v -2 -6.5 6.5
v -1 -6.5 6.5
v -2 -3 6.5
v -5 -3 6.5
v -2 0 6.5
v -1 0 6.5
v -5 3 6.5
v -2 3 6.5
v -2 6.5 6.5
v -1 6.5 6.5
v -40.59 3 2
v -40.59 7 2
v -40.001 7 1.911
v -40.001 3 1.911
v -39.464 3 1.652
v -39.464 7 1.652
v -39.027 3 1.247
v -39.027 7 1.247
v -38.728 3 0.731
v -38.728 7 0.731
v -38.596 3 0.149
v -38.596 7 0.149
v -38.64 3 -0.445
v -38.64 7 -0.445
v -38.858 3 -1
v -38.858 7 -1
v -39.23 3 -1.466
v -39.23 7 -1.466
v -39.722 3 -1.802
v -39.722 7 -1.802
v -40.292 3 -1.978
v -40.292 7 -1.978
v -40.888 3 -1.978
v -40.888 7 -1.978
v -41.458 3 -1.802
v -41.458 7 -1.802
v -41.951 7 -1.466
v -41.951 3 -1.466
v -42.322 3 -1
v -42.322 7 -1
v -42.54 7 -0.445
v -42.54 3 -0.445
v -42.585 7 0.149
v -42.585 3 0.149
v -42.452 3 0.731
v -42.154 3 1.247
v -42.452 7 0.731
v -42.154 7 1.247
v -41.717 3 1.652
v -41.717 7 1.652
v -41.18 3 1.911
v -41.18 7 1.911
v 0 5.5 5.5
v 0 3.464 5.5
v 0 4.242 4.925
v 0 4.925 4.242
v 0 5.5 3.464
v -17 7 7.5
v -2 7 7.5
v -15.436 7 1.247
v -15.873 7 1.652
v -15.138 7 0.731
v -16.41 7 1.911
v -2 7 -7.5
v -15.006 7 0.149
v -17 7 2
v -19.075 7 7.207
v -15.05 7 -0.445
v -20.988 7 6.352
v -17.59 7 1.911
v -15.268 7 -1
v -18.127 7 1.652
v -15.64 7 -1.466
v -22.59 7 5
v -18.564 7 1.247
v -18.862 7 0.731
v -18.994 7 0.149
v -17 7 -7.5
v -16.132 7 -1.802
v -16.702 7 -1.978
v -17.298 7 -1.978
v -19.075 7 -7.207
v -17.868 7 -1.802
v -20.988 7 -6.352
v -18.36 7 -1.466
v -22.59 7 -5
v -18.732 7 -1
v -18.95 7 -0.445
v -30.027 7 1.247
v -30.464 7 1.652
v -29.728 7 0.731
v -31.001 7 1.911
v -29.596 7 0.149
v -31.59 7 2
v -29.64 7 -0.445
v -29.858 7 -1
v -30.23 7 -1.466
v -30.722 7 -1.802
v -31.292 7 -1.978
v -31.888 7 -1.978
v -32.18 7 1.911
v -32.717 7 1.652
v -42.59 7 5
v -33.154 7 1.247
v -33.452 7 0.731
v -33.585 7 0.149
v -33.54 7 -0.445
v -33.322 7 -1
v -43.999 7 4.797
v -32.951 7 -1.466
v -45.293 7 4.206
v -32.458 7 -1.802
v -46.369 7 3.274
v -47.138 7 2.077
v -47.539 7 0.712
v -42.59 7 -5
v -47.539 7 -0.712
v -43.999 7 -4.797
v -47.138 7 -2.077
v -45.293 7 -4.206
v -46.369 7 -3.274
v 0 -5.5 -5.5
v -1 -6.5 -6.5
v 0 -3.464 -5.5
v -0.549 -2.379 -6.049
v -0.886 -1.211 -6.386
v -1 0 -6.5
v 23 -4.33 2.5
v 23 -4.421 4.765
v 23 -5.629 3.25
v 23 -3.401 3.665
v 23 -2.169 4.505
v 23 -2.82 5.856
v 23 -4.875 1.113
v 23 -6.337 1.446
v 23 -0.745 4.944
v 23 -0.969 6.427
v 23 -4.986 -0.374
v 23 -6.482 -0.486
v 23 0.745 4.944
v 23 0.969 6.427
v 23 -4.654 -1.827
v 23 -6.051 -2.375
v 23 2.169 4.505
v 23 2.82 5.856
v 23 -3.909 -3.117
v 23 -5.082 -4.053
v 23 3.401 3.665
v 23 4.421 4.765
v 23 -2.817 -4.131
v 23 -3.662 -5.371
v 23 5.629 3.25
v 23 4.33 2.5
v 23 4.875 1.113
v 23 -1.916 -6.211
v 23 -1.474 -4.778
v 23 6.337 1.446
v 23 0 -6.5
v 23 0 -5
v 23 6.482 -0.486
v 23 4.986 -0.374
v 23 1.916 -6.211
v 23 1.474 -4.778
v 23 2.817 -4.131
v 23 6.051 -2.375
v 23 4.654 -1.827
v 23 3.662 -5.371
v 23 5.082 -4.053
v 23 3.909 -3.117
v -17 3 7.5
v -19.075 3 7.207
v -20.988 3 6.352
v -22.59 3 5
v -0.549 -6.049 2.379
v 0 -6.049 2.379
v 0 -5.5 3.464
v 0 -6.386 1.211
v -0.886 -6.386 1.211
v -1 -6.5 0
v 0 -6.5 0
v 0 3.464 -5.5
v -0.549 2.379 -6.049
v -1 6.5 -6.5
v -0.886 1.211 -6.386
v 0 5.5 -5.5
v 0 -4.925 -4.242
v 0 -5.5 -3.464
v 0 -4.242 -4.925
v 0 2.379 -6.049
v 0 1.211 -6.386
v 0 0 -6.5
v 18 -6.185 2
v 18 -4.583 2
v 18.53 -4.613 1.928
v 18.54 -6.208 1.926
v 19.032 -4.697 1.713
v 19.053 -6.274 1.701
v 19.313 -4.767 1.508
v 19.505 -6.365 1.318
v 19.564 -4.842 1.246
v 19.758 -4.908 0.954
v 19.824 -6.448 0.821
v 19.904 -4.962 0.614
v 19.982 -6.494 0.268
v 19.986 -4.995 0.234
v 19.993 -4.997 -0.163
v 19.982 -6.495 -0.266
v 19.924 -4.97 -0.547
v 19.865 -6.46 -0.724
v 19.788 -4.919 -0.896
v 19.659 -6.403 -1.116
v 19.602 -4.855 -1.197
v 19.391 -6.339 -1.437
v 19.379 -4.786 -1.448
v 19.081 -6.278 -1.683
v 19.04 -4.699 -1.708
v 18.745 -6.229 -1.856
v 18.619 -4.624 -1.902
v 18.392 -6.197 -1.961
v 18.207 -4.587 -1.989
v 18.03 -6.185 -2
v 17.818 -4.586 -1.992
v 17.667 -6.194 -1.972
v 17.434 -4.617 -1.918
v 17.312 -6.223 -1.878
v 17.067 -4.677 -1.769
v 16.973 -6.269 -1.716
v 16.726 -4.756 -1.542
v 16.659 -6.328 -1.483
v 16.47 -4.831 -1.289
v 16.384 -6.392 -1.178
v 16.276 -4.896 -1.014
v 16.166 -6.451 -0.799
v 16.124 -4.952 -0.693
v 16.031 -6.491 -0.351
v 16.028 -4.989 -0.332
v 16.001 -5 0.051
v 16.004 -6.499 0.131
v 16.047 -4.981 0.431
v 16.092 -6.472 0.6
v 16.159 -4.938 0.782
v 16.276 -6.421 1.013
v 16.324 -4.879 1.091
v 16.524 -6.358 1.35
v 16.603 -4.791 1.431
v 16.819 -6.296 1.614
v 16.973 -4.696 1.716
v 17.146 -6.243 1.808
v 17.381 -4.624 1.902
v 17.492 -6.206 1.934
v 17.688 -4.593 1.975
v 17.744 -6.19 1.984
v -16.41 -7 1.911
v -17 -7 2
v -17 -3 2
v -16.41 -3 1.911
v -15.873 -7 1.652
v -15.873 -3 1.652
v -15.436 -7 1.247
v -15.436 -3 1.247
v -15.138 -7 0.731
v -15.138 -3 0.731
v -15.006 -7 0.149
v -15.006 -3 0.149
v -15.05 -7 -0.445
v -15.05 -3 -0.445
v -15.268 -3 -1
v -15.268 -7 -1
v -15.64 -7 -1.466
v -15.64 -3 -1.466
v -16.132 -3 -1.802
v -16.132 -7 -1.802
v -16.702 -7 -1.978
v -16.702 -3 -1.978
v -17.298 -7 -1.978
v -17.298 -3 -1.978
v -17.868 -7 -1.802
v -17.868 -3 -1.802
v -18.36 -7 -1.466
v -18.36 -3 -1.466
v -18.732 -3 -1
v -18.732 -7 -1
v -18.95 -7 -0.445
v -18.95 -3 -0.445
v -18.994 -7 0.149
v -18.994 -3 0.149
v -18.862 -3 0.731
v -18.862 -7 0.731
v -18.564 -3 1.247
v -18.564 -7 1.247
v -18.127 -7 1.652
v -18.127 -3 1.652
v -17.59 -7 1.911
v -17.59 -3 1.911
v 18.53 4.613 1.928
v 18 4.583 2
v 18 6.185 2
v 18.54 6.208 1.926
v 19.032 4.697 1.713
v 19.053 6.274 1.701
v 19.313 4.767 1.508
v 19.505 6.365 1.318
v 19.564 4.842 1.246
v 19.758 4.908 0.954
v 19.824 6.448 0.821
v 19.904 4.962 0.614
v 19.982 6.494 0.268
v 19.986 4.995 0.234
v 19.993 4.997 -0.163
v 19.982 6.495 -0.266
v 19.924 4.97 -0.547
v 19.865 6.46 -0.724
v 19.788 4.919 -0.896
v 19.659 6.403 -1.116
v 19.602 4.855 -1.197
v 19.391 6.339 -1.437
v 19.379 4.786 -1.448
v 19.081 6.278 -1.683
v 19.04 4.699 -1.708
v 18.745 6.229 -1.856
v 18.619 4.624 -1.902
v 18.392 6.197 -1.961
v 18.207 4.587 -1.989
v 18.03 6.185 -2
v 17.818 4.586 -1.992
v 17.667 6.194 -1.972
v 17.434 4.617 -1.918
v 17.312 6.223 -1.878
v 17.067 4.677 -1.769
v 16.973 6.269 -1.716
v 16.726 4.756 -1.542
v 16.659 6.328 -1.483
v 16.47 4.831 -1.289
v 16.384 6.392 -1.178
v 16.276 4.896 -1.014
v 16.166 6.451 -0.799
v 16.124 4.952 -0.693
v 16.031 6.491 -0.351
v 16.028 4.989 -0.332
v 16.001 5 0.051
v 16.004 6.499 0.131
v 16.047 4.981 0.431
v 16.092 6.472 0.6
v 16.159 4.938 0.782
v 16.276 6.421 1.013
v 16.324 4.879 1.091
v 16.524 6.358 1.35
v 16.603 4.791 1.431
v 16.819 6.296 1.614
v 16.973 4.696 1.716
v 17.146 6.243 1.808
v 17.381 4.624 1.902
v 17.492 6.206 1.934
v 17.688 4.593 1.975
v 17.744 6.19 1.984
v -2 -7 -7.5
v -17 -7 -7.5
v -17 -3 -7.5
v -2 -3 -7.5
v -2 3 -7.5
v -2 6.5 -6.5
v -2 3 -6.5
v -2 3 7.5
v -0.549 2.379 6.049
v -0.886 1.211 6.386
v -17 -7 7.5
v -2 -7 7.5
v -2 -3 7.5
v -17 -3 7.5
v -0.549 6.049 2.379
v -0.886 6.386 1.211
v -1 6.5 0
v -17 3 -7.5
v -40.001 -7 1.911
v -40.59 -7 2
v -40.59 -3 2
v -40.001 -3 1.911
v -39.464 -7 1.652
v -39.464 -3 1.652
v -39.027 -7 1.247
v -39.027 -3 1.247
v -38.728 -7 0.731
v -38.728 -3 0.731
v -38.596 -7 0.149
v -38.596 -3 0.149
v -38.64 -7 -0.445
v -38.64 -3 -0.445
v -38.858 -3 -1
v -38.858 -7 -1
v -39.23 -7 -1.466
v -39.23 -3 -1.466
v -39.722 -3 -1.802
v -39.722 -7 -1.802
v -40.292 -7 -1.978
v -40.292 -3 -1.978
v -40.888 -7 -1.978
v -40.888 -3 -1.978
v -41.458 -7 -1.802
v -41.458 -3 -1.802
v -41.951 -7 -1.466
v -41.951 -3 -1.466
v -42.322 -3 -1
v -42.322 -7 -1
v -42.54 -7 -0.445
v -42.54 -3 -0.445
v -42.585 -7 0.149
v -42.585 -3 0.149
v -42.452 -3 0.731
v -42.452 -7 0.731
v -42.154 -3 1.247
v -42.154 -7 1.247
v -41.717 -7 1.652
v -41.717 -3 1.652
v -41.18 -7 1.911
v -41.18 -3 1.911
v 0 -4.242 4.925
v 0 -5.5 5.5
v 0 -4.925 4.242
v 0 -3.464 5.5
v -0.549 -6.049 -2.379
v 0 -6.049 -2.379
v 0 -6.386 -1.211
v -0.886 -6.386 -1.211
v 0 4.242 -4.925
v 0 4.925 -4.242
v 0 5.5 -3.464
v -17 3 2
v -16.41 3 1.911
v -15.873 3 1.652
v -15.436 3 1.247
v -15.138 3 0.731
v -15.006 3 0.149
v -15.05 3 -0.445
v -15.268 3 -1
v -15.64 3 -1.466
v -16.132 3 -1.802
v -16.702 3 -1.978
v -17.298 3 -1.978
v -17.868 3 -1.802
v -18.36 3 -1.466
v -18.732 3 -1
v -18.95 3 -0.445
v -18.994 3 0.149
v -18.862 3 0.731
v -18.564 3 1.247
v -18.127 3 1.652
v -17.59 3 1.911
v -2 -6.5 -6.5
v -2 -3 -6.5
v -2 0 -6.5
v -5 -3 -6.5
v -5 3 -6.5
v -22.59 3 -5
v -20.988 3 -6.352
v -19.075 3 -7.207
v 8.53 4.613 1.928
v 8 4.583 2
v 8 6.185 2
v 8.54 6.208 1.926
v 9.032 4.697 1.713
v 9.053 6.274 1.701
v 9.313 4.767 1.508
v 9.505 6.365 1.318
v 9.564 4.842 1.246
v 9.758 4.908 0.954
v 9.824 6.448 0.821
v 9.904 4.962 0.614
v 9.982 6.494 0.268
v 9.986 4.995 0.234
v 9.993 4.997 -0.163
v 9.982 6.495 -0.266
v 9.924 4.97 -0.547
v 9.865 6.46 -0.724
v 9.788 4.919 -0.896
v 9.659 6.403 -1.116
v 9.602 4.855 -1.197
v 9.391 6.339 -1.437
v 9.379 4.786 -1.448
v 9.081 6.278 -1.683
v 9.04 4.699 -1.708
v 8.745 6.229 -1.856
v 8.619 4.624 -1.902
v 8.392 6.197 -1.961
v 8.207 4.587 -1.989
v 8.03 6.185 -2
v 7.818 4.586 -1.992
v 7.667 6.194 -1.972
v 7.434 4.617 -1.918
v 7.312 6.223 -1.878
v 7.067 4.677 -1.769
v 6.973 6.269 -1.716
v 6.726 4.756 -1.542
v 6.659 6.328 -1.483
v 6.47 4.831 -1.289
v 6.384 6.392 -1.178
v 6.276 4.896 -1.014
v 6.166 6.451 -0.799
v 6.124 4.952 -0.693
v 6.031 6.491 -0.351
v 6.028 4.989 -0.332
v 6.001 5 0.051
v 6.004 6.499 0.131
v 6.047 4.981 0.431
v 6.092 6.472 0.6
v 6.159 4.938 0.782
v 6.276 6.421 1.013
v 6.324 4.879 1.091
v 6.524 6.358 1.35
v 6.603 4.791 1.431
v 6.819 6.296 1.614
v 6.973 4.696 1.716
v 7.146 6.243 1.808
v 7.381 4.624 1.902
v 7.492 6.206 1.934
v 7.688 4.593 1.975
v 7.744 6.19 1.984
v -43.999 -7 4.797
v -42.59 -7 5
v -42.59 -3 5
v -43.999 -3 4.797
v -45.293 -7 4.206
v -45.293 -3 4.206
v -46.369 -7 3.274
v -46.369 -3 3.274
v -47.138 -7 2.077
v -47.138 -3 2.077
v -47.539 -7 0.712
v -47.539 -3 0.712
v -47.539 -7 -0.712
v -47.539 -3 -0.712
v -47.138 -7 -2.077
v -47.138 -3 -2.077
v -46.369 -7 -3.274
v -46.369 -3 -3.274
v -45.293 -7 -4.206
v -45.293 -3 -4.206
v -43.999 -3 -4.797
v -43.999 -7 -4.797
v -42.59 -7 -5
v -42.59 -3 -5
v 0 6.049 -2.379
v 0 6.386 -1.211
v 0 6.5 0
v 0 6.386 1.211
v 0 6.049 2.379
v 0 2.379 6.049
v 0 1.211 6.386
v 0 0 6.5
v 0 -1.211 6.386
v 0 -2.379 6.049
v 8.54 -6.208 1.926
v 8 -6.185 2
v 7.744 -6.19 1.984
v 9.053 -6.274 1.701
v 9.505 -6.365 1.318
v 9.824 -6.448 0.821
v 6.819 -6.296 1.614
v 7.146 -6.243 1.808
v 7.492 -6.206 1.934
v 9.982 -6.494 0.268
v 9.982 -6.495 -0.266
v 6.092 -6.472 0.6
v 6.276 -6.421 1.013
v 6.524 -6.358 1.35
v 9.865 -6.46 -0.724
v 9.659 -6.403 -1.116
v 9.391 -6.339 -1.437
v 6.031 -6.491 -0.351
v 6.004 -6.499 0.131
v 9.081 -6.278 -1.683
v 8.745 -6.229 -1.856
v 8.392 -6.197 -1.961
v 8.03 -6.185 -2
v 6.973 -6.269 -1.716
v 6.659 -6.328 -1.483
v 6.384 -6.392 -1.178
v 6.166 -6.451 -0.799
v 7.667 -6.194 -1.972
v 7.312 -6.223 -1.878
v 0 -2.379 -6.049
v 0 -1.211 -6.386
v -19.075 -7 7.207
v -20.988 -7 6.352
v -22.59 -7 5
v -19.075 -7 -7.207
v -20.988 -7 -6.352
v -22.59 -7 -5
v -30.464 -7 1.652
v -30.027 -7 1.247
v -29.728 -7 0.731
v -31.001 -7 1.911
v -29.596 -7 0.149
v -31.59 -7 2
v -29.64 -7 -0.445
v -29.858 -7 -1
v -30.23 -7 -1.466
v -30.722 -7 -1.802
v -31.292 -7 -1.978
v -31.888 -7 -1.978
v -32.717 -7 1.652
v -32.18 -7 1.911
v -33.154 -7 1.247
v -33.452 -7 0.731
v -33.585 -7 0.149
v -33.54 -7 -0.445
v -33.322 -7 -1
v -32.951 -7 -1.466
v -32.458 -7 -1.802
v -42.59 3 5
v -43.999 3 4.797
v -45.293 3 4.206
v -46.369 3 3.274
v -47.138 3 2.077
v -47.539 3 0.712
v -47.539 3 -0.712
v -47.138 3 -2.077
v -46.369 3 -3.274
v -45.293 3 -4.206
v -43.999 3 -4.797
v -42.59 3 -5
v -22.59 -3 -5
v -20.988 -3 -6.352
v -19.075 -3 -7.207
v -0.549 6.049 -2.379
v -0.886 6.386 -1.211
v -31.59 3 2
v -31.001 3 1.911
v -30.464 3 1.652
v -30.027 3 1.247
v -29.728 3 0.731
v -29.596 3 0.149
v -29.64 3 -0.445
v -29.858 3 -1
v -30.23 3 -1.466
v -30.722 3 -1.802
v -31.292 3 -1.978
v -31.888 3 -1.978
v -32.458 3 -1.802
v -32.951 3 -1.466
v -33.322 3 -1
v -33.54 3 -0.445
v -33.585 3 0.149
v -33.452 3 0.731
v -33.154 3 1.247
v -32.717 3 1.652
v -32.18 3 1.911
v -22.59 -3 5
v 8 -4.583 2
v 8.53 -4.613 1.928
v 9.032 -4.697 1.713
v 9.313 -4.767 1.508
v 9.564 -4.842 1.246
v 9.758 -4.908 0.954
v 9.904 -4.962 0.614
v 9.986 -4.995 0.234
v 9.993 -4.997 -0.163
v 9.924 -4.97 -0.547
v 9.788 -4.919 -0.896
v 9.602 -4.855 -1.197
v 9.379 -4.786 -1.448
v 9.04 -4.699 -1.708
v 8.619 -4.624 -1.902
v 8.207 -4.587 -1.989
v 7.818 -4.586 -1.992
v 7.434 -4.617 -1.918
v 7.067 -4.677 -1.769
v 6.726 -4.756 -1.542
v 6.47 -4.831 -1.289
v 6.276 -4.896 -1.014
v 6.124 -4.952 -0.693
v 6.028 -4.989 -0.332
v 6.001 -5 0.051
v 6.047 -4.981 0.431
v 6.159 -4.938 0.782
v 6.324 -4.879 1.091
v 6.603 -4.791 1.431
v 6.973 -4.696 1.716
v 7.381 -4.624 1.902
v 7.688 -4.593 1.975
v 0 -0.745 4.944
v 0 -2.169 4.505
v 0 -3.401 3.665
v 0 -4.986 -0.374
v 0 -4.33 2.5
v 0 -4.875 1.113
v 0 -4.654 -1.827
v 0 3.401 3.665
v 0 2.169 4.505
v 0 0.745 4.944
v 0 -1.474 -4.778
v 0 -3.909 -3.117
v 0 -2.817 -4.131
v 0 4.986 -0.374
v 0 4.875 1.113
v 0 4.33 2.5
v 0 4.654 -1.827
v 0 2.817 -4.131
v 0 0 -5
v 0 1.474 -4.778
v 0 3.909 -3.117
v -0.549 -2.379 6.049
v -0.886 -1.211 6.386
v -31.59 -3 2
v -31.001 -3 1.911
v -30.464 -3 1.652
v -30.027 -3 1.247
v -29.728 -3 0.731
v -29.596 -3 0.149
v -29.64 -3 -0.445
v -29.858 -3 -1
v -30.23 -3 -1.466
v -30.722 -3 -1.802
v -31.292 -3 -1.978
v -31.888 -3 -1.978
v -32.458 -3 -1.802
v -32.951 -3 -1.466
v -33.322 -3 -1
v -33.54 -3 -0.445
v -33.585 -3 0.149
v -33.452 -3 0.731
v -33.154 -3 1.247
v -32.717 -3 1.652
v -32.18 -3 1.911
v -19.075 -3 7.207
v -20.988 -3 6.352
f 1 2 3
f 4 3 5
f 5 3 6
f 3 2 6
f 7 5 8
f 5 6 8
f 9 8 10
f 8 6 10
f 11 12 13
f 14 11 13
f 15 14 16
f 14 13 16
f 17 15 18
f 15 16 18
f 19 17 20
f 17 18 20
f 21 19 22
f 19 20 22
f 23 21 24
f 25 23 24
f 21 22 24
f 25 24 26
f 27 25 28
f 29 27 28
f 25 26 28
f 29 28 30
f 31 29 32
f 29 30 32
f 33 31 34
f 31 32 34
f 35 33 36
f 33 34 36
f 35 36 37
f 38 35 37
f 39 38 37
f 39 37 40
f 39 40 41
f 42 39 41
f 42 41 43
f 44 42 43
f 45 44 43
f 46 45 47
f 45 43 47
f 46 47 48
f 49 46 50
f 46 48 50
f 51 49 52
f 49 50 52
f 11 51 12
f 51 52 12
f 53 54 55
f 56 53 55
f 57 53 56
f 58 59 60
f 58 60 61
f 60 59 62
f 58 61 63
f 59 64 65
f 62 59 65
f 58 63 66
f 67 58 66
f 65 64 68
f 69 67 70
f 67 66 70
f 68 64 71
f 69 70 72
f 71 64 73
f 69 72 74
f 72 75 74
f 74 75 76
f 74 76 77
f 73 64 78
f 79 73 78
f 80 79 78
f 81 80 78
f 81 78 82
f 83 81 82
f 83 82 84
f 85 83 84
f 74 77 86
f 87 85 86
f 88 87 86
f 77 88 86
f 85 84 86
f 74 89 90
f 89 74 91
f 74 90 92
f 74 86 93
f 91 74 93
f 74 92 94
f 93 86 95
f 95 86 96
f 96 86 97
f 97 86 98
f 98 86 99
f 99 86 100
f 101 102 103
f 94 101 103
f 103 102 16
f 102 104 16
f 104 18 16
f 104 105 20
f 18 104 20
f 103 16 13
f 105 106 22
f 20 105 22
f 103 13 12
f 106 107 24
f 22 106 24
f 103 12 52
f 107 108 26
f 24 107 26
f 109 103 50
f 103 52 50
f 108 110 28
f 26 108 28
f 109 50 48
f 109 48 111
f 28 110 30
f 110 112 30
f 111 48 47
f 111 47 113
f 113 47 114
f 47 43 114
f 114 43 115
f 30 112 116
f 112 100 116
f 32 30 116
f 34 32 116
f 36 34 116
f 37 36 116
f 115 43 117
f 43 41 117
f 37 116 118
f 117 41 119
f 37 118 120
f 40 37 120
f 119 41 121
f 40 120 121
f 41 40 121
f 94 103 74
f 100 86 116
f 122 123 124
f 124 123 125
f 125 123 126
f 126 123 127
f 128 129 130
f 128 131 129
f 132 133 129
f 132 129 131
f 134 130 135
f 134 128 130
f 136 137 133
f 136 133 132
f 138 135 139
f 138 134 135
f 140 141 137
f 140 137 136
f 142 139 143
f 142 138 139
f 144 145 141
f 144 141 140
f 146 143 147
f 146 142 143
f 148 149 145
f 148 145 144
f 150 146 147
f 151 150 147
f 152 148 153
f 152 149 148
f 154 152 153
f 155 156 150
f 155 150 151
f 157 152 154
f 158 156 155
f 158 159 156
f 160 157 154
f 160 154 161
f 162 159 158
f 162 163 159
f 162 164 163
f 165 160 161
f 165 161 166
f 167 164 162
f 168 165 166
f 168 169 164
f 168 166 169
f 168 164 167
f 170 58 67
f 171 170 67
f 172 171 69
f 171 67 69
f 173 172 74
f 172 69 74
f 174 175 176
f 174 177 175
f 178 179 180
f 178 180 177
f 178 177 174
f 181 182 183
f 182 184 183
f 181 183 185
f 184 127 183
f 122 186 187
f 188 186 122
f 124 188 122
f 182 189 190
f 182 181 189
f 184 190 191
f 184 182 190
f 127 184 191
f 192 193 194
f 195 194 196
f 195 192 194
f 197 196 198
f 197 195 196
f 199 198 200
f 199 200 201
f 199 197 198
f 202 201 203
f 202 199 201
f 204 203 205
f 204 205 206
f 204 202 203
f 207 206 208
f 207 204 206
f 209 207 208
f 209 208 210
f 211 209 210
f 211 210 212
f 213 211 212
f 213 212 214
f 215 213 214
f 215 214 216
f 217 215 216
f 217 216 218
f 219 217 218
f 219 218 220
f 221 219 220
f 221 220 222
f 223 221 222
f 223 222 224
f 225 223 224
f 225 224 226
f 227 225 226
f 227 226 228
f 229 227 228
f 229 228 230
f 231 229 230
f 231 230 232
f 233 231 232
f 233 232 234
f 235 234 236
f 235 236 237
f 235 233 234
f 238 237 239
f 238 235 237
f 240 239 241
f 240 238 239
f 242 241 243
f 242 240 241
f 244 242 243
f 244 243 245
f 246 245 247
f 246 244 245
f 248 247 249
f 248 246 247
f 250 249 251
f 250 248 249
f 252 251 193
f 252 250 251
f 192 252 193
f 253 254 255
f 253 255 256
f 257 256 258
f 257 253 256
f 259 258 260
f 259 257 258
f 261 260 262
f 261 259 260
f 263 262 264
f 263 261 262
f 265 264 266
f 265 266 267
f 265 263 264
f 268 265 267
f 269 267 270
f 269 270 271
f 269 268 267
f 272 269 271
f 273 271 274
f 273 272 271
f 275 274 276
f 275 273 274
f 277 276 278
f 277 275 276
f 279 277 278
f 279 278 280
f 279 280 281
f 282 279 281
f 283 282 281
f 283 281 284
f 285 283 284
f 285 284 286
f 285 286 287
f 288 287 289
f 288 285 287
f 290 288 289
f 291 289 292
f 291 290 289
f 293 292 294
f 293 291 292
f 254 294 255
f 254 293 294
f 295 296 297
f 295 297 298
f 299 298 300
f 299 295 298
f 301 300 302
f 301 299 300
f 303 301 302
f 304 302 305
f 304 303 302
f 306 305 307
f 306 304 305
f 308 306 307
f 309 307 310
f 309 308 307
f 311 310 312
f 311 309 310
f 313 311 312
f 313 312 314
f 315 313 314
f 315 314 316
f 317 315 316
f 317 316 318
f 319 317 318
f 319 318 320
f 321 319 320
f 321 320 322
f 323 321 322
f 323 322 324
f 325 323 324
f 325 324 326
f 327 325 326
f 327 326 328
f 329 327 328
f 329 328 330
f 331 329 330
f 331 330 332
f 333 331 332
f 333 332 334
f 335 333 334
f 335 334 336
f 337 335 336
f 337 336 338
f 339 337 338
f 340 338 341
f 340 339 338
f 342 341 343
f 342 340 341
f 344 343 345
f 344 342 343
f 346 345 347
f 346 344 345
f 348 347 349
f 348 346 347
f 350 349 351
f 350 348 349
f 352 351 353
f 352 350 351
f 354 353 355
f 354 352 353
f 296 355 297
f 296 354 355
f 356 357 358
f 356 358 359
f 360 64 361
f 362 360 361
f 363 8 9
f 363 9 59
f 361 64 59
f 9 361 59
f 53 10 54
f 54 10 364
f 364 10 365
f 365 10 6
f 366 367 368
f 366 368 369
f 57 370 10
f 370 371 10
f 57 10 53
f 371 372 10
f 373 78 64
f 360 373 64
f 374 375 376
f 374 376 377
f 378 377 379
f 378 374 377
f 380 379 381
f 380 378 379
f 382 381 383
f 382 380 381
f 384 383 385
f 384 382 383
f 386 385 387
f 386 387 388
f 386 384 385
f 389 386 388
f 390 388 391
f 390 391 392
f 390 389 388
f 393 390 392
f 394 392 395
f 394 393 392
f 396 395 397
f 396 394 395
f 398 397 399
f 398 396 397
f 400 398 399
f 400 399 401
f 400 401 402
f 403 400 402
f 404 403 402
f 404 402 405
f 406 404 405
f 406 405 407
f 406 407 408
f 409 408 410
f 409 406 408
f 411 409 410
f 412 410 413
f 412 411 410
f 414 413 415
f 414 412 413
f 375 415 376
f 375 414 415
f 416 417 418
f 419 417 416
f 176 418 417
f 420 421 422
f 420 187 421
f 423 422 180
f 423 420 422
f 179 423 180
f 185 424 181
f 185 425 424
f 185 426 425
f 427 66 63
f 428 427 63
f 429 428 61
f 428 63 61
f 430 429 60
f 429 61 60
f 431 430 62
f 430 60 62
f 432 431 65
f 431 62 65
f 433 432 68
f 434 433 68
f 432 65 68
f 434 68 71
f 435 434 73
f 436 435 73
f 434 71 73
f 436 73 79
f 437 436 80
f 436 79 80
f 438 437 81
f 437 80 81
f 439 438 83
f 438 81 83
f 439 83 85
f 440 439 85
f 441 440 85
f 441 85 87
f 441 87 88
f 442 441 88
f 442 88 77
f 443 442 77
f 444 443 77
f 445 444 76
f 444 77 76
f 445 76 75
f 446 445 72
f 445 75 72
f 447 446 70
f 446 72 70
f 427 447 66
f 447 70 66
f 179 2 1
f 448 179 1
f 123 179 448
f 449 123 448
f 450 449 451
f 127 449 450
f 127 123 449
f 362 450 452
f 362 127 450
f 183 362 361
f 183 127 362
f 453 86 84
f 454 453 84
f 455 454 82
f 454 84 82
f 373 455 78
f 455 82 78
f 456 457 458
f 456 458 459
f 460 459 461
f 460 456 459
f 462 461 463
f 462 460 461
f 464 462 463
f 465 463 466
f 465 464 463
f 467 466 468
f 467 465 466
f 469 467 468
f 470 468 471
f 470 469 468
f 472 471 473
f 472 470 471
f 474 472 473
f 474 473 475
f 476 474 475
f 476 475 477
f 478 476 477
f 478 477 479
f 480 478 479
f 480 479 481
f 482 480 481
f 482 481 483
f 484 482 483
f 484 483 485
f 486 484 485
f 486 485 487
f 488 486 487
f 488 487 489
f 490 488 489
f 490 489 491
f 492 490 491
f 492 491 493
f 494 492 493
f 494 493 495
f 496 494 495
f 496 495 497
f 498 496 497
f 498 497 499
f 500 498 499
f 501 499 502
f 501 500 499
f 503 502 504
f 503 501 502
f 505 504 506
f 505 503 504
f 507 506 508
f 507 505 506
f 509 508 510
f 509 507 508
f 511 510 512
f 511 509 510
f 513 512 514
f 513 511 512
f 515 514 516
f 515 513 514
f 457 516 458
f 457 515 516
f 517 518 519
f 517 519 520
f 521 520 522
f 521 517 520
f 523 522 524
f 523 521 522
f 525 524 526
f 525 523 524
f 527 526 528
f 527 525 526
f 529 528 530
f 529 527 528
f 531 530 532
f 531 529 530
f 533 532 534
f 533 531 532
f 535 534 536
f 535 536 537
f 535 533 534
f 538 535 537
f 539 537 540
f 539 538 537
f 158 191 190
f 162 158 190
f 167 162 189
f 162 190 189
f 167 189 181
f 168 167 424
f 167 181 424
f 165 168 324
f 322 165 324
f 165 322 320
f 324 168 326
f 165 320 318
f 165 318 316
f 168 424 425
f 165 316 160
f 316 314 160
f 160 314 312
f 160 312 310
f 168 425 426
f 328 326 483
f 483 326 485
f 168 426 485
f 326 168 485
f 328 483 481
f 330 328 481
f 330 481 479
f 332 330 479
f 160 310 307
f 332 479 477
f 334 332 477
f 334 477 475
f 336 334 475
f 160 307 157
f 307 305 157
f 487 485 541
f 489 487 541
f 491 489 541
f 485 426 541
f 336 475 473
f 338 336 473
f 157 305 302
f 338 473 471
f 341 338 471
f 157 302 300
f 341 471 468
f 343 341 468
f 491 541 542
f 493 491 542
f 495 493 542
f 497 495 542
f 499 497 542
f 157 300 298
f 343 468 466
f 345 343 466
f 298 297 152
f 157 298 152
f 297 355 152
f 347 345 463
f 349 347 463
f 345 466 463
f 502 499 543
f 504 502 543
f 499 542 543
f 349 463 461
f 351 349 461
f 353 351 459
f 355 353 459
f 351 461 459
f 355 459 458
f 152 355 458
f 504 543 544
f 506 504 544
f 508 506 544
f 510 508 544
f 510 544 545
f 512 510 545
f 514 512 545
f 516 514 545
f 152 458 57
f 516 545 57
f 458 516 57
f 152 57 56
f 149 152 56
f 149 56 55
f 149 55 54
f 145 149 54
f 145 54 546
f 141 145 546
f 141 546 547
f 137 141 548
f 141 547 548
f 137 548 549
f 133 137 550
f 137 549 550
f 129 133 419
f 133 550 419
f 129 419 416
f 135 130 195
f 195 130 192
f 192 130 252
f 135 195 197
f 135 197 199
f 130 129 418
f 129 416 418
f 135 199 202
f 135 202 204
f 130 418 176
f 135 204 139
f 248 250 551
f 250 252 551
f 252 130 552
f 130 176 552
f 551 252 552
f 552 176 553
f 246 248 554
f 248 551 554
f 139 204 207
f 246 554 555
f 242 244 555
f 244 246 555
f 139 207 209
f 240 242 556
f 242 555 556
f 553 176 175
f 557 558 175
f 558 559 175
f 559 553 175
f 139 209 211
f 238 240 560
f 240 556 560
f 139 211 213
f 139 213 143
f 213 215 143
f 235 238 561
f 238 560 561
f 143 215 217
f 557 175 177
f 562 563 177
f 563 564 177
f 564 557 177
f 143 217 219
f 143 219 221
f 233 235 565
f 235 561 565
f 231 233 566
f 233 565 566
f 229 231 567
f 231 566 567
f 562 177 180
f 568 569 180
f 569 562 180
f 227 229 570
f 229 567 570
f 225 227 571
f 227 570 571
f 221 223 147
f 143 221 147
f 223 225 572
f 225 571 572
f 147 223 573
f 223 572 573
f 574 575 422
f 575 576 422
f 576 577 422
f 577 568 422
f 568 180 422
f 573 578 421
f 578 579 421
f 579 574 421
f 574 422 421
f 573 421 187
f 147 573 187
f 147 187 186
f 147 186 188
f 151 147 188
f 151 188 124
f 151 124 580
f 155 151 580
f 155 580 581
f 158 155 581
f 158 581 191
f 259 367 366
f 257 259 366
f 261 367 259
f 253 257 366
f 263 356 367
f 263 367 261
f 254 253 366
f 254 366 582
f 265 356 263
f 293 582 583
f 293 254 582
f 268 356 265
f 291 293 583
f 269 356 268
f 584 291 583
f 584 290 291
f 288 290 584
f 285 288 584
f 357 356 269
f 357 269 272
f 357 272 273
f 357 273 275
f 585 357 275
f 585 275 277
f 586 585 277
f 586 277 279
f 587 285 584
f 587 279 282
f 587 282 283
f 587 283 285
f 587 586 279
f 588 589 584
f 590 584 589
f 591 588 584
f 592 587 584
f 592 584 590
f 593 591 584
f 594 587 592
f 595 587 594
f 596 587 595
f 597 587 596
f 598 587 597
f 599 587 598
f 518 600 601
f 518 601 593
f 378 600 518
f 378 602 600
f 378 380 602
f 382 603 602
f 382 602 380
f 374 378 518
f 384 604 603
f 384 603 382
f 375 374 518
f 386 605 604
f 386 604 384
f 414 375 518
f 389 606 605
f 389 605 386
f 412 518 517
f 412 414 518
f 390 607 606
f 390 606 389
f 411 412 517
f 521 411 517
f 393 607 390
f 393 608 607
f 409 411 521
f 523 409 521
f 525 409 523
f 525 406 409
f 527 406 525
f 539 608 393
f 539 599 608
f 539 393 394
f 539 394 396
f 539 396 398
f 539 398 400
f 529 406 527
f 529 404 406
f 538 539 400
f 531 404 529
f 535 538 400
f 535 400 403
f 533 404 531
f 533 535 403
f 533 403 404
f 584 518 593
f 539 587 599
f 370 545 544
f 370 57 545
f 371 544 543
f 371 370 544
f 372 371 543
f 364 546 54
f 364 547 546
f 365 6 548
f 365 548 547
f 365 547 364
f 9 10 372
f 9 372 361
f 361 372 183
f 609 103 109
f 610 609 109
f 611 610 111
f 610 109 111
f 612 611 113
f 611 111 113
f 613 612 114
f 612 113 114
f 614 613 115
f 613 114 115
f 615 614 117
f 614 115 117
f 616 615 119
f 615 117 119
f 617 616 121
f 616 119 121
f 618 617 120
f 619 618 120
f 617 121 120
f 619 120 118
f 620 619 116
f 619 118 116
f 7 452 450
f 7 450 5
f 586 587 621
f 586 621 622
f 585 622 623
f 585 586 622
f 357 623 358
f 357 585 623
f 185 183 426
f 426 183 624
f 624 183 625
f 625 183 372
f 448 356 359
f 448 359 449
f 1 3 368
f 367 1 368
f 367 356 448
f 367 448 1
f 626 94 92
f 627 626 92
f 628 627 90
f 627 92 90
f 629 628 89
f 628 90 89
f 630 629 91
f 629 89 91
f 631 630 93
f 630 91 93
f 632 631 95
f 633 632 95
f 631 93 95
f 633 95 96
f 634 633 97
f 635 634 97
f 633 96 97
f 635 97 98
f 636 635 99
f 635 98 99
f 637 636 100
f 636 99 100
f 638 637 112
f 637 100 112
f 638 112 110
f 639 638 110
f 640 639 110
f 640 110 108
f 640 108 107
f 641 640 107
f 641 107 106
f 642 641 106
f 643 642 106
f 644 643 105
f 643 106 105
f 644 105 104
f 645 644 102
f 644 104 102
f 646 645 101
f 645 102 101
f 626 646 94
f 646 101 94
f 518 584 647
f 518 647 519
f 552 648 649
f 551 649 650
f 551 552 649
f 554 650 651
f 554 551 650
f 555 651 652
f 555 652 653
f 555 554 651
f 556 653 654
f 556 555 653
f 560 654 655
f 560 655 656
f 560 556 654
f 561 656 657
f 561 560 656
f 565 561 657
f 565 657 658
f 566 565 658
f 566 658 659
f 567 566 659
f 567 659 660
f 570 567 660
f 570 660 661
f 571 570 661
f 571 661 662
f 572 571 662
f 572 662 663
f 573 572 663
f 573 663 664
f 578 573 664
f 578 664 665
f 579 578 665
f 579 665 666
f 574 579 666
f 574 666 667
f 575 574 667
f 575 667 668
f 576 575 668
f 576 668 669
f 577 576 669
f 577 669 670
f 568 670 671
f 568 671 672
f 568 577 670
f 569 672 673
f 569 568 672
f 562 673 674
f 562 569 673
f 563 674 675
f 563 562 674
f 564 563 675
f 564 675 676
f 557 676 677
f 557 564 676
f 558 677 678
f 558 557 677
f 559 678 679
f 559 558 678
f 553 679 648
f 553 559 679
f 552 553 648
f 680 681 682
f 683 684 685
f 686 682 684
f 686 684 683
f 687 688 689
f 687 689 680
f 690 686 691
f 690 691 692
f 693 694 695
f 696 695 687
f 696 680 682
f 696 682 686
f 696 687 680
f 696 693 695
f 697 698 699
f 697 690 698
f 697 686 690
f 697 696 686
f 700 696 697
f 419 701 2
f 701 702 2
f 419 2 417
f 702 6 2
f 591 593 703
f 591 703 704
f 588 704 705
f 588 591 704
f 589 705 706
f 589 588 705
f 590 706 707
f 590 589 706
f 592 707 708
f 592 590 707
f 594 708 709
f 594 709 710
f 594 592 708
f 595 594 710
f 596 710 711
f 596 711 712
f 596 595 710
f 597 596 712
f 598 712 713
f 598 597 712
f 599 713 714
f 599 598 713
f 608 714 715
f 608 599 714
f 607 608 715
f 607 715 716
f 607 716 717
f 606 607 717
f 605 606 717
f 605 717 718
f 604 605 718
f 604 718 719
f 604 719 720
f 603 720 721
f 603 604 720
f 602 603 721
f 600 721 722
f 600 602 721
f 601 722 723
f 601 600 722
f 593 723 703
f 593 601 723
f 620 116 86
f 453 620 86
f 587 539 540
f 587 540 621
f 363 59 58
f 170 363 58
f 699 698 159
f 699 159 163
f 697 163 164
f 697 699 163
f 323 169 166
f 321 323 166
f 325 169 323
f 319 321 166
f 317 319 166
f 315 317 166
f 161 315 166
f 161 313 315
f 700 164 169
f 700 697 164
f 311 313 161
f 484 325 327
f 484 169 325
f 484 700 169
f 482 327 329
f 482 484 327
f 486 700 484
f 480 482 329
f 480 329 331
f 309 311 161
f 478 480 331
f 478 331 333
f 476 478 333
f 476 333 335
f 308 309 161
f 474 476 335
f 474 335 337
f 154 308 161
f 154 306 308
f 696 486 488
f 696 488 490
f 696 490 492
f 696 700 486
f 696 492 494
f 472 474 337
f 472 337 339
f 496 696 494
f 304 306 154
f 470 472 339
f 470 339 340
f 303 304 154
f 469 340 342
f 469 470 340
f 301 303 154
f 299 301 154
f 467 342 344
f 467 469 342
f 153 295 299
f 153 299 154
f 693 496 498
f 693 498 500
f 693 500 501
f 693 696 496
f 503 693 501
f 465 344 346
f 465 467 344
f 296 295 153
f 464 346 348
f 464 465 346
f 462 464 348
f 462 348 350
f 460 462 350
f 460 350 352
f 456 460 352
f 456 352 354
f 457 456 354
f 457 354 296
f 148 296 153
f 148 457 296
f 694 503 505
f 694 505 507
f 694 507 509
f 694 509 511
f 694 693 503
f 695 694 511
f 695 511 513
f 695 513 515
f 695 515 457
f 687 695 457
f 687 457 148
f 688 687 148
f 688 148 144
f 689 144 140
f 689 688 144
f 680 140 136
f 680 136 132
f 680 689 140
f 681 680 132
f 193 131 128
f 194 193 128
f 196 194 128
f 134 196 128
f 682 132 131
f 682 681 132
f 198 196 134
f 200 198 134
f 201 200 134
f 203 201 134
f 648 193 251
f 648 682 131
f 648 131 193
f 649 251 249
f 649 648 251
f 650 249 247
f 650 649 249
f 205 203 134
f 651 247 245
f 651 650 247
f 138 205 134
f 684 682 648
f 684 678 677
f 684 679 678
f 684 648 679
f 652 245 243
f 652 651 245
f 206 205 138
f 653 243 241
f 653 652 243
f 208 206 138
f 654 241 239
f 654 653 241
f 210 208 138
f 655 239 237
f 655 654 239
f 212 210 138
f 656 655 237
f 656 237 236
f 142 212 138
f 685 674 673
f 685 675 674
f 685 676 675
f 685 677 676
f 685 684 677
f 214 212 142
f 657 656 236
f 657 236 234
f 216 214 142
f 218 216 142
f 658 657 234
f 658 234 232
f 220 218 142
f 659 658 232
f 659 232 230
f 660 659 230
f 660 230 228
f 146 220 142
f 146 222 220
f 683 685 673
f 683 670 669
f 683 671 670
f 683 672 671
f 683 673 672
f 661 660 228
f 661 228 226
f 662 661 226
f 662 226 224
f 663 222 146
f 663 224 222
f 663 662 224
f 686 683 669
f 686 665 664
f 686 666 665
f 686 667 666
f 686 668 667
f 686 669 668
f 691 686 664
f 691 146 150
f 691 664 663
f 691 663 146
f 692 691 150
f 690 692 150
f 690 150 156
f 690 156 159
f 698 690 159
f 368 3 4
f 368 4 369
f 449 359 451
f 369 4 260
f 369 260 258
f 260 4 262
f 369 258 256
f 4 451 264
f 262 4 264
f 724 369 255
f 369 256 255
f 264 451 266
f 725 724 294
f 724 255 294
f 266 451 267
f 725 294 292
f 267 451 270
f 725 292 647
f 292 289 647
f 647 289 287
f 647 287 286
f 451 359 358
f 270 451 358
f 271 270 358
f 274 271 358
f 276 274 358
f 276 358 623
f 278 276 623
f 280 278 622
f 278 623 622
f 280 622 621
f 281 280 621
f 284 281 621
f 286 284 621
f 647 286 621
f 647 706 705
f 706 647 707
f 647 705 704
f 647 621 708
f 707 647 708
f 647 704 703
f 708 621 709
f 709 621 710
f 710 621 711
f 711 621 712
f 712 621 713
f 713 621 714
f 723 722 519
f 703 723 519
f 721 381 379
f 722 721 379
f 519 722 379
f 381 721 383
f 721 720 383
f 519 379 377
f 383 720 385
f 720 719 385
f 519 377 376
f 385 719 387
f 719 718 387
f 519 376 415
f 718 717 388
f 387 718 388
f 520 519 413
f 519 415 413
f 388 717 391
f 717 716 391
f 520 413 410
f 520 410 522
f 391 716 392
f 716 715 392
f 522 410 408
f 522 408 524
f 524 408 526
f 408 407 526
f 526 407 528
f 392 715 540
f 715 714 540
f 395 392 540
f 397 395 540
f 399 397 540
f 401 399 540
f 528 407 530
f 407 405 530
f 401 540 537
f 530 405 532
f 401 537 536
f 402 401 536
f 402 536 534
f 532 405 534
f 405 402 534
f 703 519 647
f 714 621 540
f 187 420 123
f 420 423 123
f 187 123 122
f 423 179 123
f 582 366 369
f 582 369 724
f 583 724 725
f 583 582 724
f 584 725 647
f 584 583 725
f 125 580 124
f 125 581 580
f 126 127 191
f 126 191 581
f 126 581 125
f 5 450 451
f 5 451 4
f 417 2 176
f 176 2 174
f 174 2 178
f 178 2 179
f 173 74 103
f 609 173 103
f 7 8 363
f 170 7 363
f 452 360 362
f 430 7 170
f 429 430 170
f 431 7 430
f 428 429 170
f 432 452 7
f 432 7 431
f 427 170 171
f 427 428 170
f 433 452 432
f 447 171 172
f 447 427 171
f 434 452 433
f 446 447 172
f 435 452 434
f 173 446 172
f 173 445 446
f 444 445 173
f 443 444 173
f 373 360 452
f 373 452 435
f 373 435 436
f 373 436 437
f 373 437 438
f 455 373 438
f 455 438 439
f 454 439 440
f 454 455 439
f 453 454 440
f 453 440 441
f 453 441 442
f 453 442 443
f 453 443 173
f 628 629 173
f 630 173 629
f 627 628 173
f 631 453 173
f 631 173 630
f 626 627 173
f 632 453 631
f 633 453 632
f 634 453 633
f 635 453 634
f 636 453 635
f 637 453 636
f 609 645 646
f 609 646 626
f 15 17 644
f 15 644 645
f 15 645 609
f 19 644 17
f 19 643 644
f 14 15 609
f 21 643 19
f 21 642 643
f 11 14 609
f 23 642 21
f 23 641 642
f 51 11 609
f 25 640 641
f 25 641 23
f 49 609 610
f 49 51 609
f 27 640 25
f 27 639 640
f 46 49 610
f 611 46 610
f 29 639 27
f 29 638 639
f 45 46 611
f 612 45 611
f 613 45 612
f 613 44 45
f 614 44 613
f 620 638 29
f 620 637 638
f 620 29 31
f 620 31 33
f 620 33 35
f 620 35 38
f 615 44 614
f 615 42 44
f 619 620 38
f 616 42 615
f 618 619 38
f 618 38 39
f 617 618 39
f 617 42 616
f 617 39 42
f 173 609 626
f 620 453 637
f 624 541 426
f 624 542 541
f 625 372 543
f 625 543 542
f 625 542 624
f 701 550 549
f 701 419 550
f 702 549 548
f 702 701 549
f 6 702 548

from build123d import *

# Parameters (mm, degrees)
SKETCH1_R               = 6.5
SKETCH1_R_2             = 5
BOSS_EXTRUDE1_DEPTH     = 23
SKETCH2_W               = 13
SKETCH2_H               = 13
BOSS_EXTRUDE2_DEPTH     = 2
CUT_EXTRUDE1_DEPTH      = 25.768932153
CUT_EXTRUDE1_DEPTH_BACK = 25.768932153
SKETCH4_R               = 2
SKETCH5_R               = 2
BOSS_EXTRUDE5_DEPTH     = 4
CHAMFER2_SIZE           = 3
CHAMFER3_SIZE           = 1


# Some blends are built 0.0001 mm under size
with BuildPart() as part:
    # Sketch1 → Boss-Extrude1 (new body)
    with BuildSketch(Plane(origin=(0, 0, 0), x_dir=(0, 0, -1), z_dir=(1, 0, 0))):
        Circle(SKETCH1_R)
        Circle(SKETCH1_R_2, mode=Mode.SUBTRACT)
    extrude(amount=BOSS_EXTRUDE1_DEPTH)

    # Sketch2 → Boss-Extrude2 (add)
    with BuildSketch(Plane(origin=(0, 0, 0), x_dir=(0, 0, -1), z_dir=(1, 0, 0))):
        Rectangle(SKETCH2_W, SKETCH2_H)
    extrude(amount=-BOSS_EXTRUDE2_DEPTH)

    # Sketch4 → Cut-Extrude1 (cut, two sides: drawn at the far end of the back side and taken through both)
    with BuildSketch(Plane(origin=(0, 0, 0), x_dir=(1, 0, 0), z_dir=(0, 1, 0)).offset(-CUT_EXTRUDE1_DEPTH_BACK)):
        with Locations(Location((8, 0, 0), (0, 0, 270))):
            Circle(SKETCH4_R)
        with Locations(Location((18, 0, 0), (0, 0, 270))):
            Circle(SKETCH4_R)
    extrude(amount=CUT_EXTRUDE1_DEPTH + CUT_EXTRUDE1_DEPTH_BACK, mode=Mode.SUBTRACT)

    # Sketch5 → Boss-Extrude5 (add)
    with BuildSketch(Plane(origin=(0, 7, 0), x_dir=(1, 0, 0), z_dir=(0, 1, 0))):
        with BuildLine():
            Line((-2, 7.5), (-2, -7.5))
            Line((-2, -7.5), (-17, -7.5))
            ThreePointArc((-17, -7.5), (-20.061862178, -6.846531969), (-22.590169944, -5))
            Line((-22.590169944, -5), (-42.590169944, -5))
            ThreePointArc((-42.590169944, -5), (-47.590169944, 0), (-42.590169944, 5))
            Line((-42.590169944, 5), (-22.590169944, 5))
            ThreePointArc((-22.590169944, 5), (-20.061862178, 6.846531969), (-17, 7.5))
            Line((-17, 7.5), (-2, 7.5))
        make_face()
        with Locations(Location((-40.590169944, 0, 0), (0, 0, 270))):
            Circle(SKETCH5_R, mode=Mode.SUBTRACT)
        with Locations(Location((-17, 0, 0), (0, 0, 270))):
            Circle(SKETCH5_R, mode=Mode.SUBTRACT)
        with Locations(Location((-31.590169944, 0, 0), (0, 0, 270))):
            Circle(SKETCH5_R, mode=Mode.SUBTRACT)
    boss_extrude5 = extrude(amount=-BOSS_EXTRUDE5_DEPTH)

    # Mirror2: Boss-Extrude5 across plane
    add(boss_extrude5.mirror(Plane.ZX))

    # Chamfer2
    chamfer2_edges = [part.edges().sort_by_distance(p)[0] for p in [
        (-2, 3, 0),
        (-2, -3, 0),
    ]]
    chamfer(chamfer2_edges, length=CHAMFER2_SIZE - 0.0001)  # a hair under: the kernel refuses the full size

    # Chamfer3
    # the kernel refuses this chamfer: 1 mm, written as the material it takes off along each edge
    with BuildSketch(Plane(origin=(0, 9.071682988, -6.5), x_dir=(-0.9996219169112968, 0, -0.027495876610586494), z_dir=(0, -1, 0))) as chamfer3_piece_1_section:
        Polygon((CHAMFER3_SIZE * 0.999621916911, -CHAMFER3_SIZE * 0.0274958766106), (-CHAMFER3_SIZE * 0.0274958766106, -CHAMFER3_SIZE * 0.999621916911), (0, 0), align=None)
    chamfer3_piece_1 = extrude(amount=9.071682988, mode=Mode.PRIVATE)
    chamfer3_piece_1 = chamfer3_piece_1 - Plane(origin=(-0.352424936, 0, 0), x_dir=(0, 0, -1), z_dir=(-1, 0, 0)) * Cylinder(6.5, 23, mode=Mode.PRIVATE)
    add(chamfer3_piece_1, mode=Mode.SUBTRACT)
    with BuildSketch(Plane(origin=(0, 6.5, 2.6e-08), x_dir=(-0.9996219169112968, 0.027495876610586494, 0), z_dir=(0, 0, -1))) as chamfer3_piece_2_section:
        Polygon((CHAMFER3_SIZE * 0.999621916911, -CHAMFER3_SIZE * 0.0274958766106), (-CHAMFER3_SIZE * 0.0274958766106, -CHAMFER3_SIZE * 0.999621916911), (0, 0), align=None)
    chamfer3_piece_2 = extrude(amount=9.071683014, mode=Mode.PRIVATE)
    chamfer3_piece_2 = chamfer3_piece_2 - Plane(origin=(-0.352424936, 0, 0), x_dir=(0, 0, -1), z_dir=(-1, 0, 0)) * Cylinder(6.5, 23, mode=Mode.PRIVATE)
    add(chamfer3_piece_2, mode=Mode.SUBTRACT)
    with BuildSketch(Plane(origin=(0, 6.5, 9.071682988), x_dir=(-0.9996219169112968, 0.027495876610586494, 0), z_dir=(0, 0, -1))) as chamfer3_piece_3_section:
        Polygon((CHAMFER3_SIZE * 0.999621916911, -CHAMFER3_SIZE * 0.0274958766106), (-CHAMFER3_SIZE * 0.0274958766106, -CHAMFER3_SIZE * 0.999621916911), (0, 0), align=None)
    chamfer3_piece_3 = extrude(amount=9.071682962, mode=Mode.PRIVATE)
    chamfer3_piece_3 = chamfer3_piece_3 - Plane(origin=(-0.352424936, 0, 0), x_dir=(0, 0, -1), z_dir=(-1, 0, 0)) * Cylinder(6.5, 23, mode=Mode.PRIVATE)
    add(chamfer3_piece_3, mode=Mode.SUBTRACT)
    with BuildSketch(Plane(origin=(0, -8e-09, 6.5), x_dir=(-0.9996219169112968, 0, 0.027495876610586494), z_dir=(0, 1, 0))) as chamfer3_piece_4_section:
        Polygon((CHAMFER3_SIZE * 0.999621916911, -CHAMFER3_SIZE * 0.0274958766106), (-CHAMFER3_SIZE * 0.0274958766106, -CHAMFER3_SIZE * 0.999621916911), (0, 0), align=None)
    chamfer3_piece_4 = extrude(amount=9.071682996, mode=Mode.PRIVATE)
    chamfer3_piece_4 = chamfer3_piece_4 - Plane(origin=(-0.352424936, 0, 0), x_dir=(0, 0, -1), z_dir=(-1, 0, 0)) * Cylinder(6.5, 23, mode=Mode.PRIVATE)
    add(chamfer3_piece_4, mode=Mode.SUBTRACT)
    with BuildSketch(Plane(origin=(0, -9.071682988, 6.5), x_dir=(-0.9996219169112968, 0, 0.027495876610586494), z_dir=(0, 1, 0))) as chamfer3_piece_5_section:
        Polygon((CHAMFER3_SIZE * 0.999621916911, -CHAMFER3_SIZE * 0.0274958766106), (-CHAMFER3_SIZE * 0.0274958766106, -CHAMFER3_SIZE * 0.999621916911), (0, 0), align=None)
    chamfer3_piece_5 = extrude(amount=9.07168298, mode=Mode.PRIVATE)
    chamfer3_piece_5 = chamfer3_piece_5 - Plane(origin=(-0.352424936, 0, 0), x_dir=(0, 0, -1), z_dir=(-1, 0, 0)) * Cylinder(6.5, 23, mode=Mode.PRIVATE)
    add(chamfer3_piece_5, mode=Mode.SUBTRACT)
    with BuildSketch(Plane(origin=(0, -6.5, 0), x_dir=(-0.9996219169112968, -0.027495876610586494, 0), z_dir=(0, 0, 1))) as chamfer3_piece_6_section:
        Polygon((CHAMFER3_SIZE * 0.999621916911, -CHAMFER3_SIZE * 0.0274958766106), (-CHAMFER3_SIZE * 0.0274958766106, -CHAMFER3_SIZE * 0.999621916911), (0, 0), align=None)
    chamfer3_piece_6 = extrude(amount=9.071682988, mode=Mode.PRIVATE)
    chamfer3_piece_6 = chamfer3_piece_6 - Plane(origin=(-0.352424936, 0, 0), x_dir=(0, 0, -1), z_dir=(-1, 0, 0)) * Cylinder(6.5, 23, mode=Mode.PRIVATE)
    add(chamfer3_piece_6, mode=Mode.SUBTRACT)
    with BuildSketch(Plane(origin=(0, -6.5, -9.071682988), x_dir=(-0.9996219169112968, -0.027495876610586494, 0), z_dir=(0, 0, 1))) as chamfer3_piece_7_section:
        Polygon((CHAMFER3_SIZE * 0.999621916911, -CHAMFER3_SIZE * 0.0274958766106), (-CHAMFER3_SIZE * 0.0274958766106, -CHAMFER3_SIZE * 0.999621916911), (0, 0), align=None)
    chamfer3_piece_7 = extrude(amount=9.071682988, mode=Mode.PRIVATE)
    chamfer3_piece_7 = chamfer3_piece_7 - Plane(origin=(-0.352424936, 0, 0), x_dir=(0, 0, -1), z_dir=(-1, 0, 0)) * Cylinder(6.5, 23, mode=Mode.PRIVATE)
    add(chamfer3_piece_7, mode=Mode.SUBTRACT)
    with BuildSketch(Plane(origin=(0, 0, -6.5), x_dir=(-0.9996219169112968, 0, -0.027495876610586494), z_dir=(0, -1, 0))) as chamfer3_piece_8_section:
        Polygon((CHAMFER3_SIZE * 0.999621916911, -CHAMFER3_SIZE * 0.0274958766106), (-CHAMFER3_SIZE * 0.0274958766106, -CHAMFER3_SIZE * 0.999621916911), (0, 0), align=None)
    chamfer3_piece_8 = extrude(amount=9.071682988, mode=Mode.PRIVATE)
    chamfer3_piece_8 = chamfer3_piece_8 - Plane(origin=(-0.352424936, 0, 0), x_dir=(0, 0, -1), z_dir=(-1, 0, 0)) * Cylinder(6.5, 23, mode=Mode.PRIVATE)
    add(chamfer3_piece_8, mode=Mode.SUBTRACT)


solid = part.part
